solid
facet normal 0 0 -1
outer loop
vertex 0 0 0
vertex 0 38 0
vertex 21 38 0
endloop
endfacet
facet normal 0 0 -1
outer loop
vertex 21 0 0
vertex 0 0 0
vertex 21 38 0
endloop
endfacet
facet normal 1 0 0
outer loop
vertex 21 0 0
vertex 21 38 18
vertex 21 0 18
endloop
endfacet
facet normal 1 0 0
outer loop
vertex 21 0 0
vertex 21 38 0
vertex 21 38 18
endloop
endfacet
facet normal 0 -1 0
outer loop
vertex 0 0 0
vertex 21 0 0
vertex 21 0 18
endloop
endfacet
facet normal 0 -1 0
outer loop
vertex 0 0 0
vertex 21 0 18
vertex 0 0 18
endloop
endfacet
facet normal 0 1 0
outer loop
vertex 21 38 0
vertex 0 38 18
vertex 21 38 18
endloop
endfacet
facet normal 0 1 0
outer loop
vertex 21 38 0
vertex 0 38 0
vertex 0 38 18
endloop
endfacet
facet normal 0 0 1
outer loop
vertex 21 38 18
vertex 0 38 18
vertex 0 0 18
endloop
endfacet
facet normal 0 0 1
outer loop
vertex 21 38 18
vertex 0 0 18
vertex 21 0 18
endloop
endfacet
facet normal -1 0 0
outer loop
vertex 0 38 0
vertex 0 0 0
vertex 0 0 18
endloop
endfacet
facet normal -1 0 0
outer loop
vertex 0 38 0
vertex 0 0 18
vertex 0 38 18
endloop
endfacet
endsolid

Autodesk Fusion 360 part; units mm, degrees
sketch "Sketch1" plane through (0, 0, 0) normal (0, 0, 1) x (1, 0, 0)
  line L0 (0, 0) -> (0, 20)
  line L1 (0, 20) -> (20, 20)
  line L2 (20, 20) -> (20, 0)
  line L3 (20, 0) -> (0, 0)
  dimension "d2" = 20
  dimension "d3" = 20
  dimension "d4" = 20
extrude "Extrude1" add sketch "Sketch1" along normal blind 2

Autodesk Fusion 360 part; units mm, degrees
sketch "Sketch1" plane through (0, 0, 0) normal (0, 0, 1) x (1, 0, 0)
  line L0 (0, 0) -> (0, 67)
  line L1 (0, 67) -> (26, 67)
  line L2 (26, 67) -> (26, 0)
  line L3 (26, 0) -> (0, 0)
  dimension "d1" = 67
  dimension "d2" = 26
  dimension "d3" = 67
extrude "Extrude1" add sketch "Sketch1" along normal blind 18

Autodesk Fusion 360 part; units mm, degrees
sketch "Sketch1" plane through (0, 0, 0) normal (0, 0, 1) x (1, 0, 0)
  line L0 (0, 0) -> (0, 38)
  line L1 (0, 38) -> (21, 38)
  line L2 (21, 38) -> (21, 0)
  line L3 (21, 0) -> (0, 0)
  dimension "d1" = 38
  dimension "d2" = 21
  dimension "d3" = 38
extrude "Extrude1" add sketch "Sketch1" along normal blind 7
